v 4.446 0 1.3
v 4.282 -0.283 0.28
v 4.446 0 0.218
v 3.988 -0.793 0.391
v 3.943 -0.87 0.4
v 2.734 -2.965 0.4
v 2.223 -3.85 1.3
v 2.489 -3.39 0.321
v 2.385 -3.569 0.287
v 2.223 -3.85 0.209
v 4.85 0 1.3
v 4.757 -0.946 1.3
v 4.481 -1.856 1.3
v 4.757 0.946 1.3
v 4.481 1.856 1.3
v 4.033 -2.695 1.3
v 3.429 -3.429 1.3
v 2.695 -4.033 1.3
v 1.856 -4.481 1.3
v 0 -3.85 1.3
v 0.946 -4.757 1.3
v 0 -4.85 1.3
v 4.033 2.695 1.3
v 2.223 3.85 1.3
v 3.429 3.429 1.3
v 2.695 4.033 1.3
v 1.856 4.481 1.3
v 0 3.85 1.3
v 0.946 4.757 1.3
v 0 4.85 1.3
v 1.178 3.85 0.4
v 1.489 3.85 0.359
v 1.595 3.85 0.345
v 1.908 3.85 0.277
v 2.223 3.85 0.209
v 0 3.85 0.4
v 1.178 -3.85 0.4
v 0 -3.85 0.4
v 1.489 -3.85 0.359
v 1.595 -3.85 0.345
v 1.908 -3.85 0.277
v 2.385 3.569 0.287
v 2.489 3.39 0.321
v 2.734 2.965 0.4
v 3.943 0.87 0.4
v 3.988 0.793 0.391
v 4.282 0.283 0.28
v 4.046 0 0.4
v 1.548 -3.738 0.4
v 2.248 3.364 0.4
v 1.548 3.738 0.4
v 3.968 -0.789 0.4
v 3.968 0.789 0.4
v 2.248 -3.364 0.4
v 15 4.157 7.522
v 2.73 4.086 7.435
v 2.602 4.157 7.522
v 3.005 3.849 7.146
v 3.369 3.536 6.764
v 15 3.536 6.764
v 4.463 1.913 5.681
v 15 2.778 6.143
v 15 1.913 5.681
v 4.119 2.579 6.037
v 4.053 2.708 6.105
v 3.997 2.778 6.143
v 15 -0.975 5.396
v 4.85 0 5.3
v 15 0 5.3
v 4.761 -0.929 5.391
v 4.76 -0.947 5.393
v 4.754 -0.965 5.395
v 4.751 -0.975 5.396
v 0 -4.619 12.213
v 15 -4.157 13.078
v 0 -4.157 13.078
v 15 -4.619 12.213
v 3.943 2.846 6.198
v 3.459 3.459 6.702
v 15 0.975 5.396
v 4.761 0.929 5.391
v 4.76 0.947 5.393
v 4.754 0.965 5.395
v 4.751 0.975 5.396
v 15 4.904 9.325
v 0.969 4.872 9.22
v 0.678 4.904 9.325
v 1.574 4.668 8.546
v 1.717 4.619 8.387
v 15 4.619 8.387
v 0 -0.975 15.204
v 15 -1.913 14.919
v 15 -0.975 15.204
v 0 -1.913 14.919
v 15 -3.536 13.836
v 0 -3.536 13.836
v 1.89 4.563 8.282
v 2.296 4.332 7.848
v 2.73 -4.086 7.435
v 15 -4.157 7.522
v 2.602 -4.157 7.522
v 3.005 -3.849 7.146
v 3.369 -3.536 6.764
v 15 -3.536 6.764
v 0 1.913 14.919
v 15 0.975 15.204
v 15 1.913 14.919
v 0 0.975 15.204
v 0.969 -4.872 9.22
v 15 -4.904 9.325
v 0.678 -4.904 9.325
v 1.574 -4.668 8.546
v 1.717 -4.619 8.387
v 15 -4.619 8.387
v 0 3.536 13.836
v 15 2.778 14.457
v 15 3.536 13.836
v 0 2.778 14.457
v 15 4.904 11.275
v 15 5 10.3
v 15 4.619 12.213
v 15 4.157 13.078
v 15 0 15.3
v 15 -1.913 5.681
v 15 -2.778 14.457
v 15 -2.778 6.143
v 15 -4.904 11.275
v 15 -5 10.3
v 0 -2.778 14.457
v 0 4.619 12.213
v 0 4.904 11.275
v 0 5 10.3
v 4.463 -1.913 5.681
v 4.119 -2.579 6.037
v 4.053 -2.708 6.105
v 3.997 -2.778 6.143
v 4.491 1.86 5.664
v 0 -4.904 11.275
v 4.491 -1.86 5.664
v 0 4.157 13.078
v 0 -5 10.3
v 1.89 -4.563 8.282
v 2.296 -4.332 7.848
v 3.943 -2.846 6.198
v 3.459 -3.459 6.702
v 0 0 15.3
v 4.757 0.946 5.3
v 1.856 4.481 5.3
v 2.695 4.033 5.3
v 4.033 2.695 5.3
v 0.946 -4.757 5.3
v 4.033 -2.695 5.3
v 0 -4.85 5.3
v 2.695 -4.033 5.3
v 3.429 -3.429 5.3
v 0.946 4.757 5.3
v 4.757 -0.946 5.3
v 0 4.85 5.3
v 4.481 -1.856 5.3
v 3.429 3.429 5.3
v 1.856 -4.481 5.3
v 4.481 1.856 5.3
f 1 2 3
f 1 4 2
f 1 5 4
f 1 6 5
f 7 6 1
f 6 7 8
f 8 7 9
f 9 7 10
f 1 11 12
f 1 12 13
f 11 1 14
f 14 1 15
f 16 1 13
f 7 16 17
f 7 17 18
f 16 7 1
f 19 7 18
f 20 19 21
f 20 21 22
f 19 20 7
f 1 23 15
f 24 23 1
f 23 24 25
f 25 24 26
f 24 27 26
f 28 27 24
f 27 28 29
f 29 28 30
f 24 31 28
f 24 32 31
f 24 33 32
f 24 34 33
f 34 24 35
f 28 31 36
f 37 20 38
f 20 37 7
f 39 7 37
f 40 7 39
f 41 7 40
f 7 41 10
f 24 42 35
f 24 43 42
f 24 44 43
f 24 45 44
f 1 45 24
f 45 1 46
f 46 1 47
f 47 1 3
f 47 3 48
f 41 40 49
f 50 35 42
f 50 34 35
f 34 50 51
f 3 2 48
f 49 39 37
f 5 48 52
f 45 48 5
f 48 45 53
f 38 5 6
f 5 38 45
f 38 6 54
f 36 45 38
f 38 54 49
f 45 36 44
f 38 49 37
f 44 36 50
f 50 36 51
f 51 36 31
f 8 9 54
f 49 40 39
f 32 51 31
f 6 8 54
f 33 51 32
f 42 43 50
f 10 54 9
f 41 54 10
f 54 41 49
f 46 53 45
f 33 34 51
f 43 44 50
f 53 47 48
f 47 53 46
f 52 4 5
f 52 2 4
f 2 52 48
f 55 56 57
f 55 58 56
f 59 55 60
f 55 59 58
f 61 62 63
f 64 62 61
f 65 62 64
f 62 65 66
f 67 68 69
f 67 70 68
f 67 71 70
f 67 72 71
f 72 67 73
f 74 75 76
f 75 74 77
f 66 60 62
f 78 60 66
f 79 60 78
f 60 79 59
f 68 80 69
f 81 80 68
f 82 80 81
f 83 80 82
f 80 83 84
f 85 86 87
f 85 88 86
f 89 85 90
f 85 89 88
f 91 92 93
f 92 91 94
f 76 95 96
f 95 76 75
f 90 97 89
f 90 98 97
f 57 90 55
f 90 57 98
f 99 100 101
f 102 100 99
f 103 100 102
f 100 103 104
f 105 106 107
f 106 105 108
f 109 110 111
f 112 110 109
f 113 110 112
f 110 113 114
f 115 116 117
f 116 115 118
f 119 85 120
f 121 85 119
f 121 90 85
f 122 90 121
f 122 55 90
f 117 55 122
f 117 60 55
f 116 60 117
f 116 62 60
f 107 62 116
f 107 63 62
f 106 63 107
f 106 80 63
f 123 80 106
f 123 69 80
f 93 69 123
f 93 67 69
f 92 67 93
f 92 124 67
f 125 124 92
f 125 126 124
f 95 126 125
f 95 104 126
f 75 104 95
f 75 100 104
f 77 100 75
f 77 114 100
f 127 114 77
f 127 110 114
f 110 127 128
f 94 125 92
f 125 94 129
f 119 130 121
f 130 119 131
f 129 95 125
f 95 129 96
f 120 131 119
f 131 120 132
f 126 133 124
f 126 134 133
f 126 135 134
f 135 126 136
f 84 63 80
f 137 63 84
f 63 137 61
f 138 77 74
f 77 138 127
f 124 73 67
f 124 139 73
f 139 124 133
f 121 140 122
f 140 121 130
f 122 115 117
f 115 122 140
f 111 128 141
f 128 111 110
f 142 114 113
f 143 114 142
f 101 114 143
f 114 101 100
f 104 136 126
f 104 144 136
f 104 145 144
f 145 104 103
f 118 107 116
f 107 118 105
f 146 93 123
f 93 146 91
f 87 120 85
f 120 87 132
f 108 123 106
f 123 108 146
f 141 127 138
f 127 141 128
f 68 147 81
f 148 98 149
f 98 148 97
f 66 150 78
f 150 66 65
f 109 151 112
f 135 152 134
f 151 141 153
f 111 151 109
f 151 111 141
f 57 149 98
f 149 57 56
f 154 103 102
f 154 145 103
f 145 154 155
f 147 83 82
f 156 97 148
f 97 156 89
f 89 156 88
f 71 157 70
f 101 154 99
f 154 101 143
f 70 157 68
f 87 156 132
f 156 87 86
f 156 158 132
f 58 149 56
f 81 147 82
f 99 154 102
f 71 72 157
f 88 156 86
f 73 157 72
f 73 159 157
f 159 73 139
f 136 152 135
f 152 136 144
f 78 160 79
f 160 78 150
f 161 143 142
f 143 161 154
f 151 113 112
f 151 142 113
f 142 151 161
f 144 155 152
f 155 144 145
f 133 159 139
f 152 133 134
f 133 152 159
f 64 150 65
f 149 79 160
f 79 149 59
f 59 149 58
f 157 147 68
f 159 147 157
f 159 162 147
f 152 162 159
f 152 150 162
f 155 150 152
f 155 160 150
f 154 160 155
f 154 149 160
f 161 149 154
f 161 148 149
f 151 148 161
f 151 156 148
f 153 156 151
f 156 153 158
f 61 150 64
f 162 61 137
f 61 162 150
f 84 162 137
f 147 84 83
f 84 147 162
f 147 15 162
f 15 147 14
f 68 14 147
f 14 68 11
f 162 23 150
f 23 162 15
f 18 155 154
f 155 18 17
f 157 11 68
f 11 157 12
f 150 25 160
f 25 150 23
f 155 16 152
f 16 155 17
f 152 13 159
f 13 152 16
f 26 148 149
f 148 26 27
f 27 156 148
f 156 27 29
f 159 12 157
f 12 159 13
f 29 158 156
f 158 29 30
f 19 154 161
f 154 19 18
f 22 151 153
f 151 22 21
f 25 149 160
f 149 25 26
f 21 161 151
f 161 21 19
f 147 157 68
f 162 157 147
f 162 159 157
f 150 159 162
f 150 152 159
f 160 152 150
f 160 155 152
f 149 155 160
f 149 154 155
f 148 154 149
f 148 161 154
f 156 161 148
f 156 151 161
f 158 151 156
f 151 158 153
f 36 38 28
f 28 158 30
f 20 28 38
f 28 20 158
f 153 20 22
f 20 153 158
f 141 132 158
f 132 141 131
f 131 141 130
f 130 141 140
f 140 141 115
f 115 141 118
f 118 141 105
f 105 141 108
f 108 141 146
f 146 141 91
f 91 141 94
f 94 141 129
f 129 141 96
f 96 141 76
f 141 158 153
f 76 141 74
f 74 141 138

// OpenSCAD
// file: ../stamp_generated.scad
// AUTO-GENERATED by scripts/Export-OpenScadStl.ps1 - do not edit by hand
// Source: print-stamp-config.json

info_stamp_line1 = "Verminology";
info_stamp_line2 = "Liquid Bait Station";
info_stamp_line3 = "v2.5.0 Prototype";
reservoir_stamp_bottom = false;
station_stamp_bottom = true;
needle_insert_stamp_bottom = false;
needle_gasket_export_stamp_bottom = false;
needle_seal_stamp_bottom = false;
// main file
// Hex key tool for needle insert — print in PLA/PETG.
// The hex shaft engages the socket on the insert bottom face;
// the T-handle provides grip and torque.

include <common.scad>

key_hex_af       = needle_insert_hex_across_flats - 0.3;  // slight undersize for clearance
key_hex_length   = needle_insert_hex_depth - 0.2;         // don't bottom out
key_shaft_dia    = key_hex_af + 2;                        // round collar above hex
key_shaft_length = 4;                                     // grip transition
key_handle_dia   = 10;
key_handle_length = 30;
key_chamfer      = 0.4;

module needle_insert_key() {
    render_if_needed()
        union() {
            // Hex shaft (engages the insert socket)
            difference() {
                linear_extrude(height = key_hex_length)
                    circle(d = key_hex_af / cos(30), $fn = 6);
                // Lead-in chamfer on the tip
                translate([0, 0, -0.01])
                    cylinder(h = key_chamfer + 0.01,
                             d1 = key_hex_af / cos(30) + 1,
                             d2 = key_hex_af / cos(30) - 2 * key_chamfer);
            }
            // Round collar
            translate([0, 0, key_hex_length])
                cylinder(h = key_shaft_length, d = key_shaft_dia);
            // T-handle
            translate([0, 0, key_hex_length + key_shaft_length])
                union() {
                    // Cross-bar
                    translate([0, 0, key_handle_dia / 2])
                        rotate([0, 90, 0])
                            cylinder(h = key_handle_length, d = key_handle_dia, center = true);
                    // Fillet between shaft and cross-bar
                    cylinder(h = key_handle_dia / 2, d1 = key_shaft_dia, d2 = key_handle_dia);
                }
        }
}

crosssection(key_handle_length) needle_insert_key();
